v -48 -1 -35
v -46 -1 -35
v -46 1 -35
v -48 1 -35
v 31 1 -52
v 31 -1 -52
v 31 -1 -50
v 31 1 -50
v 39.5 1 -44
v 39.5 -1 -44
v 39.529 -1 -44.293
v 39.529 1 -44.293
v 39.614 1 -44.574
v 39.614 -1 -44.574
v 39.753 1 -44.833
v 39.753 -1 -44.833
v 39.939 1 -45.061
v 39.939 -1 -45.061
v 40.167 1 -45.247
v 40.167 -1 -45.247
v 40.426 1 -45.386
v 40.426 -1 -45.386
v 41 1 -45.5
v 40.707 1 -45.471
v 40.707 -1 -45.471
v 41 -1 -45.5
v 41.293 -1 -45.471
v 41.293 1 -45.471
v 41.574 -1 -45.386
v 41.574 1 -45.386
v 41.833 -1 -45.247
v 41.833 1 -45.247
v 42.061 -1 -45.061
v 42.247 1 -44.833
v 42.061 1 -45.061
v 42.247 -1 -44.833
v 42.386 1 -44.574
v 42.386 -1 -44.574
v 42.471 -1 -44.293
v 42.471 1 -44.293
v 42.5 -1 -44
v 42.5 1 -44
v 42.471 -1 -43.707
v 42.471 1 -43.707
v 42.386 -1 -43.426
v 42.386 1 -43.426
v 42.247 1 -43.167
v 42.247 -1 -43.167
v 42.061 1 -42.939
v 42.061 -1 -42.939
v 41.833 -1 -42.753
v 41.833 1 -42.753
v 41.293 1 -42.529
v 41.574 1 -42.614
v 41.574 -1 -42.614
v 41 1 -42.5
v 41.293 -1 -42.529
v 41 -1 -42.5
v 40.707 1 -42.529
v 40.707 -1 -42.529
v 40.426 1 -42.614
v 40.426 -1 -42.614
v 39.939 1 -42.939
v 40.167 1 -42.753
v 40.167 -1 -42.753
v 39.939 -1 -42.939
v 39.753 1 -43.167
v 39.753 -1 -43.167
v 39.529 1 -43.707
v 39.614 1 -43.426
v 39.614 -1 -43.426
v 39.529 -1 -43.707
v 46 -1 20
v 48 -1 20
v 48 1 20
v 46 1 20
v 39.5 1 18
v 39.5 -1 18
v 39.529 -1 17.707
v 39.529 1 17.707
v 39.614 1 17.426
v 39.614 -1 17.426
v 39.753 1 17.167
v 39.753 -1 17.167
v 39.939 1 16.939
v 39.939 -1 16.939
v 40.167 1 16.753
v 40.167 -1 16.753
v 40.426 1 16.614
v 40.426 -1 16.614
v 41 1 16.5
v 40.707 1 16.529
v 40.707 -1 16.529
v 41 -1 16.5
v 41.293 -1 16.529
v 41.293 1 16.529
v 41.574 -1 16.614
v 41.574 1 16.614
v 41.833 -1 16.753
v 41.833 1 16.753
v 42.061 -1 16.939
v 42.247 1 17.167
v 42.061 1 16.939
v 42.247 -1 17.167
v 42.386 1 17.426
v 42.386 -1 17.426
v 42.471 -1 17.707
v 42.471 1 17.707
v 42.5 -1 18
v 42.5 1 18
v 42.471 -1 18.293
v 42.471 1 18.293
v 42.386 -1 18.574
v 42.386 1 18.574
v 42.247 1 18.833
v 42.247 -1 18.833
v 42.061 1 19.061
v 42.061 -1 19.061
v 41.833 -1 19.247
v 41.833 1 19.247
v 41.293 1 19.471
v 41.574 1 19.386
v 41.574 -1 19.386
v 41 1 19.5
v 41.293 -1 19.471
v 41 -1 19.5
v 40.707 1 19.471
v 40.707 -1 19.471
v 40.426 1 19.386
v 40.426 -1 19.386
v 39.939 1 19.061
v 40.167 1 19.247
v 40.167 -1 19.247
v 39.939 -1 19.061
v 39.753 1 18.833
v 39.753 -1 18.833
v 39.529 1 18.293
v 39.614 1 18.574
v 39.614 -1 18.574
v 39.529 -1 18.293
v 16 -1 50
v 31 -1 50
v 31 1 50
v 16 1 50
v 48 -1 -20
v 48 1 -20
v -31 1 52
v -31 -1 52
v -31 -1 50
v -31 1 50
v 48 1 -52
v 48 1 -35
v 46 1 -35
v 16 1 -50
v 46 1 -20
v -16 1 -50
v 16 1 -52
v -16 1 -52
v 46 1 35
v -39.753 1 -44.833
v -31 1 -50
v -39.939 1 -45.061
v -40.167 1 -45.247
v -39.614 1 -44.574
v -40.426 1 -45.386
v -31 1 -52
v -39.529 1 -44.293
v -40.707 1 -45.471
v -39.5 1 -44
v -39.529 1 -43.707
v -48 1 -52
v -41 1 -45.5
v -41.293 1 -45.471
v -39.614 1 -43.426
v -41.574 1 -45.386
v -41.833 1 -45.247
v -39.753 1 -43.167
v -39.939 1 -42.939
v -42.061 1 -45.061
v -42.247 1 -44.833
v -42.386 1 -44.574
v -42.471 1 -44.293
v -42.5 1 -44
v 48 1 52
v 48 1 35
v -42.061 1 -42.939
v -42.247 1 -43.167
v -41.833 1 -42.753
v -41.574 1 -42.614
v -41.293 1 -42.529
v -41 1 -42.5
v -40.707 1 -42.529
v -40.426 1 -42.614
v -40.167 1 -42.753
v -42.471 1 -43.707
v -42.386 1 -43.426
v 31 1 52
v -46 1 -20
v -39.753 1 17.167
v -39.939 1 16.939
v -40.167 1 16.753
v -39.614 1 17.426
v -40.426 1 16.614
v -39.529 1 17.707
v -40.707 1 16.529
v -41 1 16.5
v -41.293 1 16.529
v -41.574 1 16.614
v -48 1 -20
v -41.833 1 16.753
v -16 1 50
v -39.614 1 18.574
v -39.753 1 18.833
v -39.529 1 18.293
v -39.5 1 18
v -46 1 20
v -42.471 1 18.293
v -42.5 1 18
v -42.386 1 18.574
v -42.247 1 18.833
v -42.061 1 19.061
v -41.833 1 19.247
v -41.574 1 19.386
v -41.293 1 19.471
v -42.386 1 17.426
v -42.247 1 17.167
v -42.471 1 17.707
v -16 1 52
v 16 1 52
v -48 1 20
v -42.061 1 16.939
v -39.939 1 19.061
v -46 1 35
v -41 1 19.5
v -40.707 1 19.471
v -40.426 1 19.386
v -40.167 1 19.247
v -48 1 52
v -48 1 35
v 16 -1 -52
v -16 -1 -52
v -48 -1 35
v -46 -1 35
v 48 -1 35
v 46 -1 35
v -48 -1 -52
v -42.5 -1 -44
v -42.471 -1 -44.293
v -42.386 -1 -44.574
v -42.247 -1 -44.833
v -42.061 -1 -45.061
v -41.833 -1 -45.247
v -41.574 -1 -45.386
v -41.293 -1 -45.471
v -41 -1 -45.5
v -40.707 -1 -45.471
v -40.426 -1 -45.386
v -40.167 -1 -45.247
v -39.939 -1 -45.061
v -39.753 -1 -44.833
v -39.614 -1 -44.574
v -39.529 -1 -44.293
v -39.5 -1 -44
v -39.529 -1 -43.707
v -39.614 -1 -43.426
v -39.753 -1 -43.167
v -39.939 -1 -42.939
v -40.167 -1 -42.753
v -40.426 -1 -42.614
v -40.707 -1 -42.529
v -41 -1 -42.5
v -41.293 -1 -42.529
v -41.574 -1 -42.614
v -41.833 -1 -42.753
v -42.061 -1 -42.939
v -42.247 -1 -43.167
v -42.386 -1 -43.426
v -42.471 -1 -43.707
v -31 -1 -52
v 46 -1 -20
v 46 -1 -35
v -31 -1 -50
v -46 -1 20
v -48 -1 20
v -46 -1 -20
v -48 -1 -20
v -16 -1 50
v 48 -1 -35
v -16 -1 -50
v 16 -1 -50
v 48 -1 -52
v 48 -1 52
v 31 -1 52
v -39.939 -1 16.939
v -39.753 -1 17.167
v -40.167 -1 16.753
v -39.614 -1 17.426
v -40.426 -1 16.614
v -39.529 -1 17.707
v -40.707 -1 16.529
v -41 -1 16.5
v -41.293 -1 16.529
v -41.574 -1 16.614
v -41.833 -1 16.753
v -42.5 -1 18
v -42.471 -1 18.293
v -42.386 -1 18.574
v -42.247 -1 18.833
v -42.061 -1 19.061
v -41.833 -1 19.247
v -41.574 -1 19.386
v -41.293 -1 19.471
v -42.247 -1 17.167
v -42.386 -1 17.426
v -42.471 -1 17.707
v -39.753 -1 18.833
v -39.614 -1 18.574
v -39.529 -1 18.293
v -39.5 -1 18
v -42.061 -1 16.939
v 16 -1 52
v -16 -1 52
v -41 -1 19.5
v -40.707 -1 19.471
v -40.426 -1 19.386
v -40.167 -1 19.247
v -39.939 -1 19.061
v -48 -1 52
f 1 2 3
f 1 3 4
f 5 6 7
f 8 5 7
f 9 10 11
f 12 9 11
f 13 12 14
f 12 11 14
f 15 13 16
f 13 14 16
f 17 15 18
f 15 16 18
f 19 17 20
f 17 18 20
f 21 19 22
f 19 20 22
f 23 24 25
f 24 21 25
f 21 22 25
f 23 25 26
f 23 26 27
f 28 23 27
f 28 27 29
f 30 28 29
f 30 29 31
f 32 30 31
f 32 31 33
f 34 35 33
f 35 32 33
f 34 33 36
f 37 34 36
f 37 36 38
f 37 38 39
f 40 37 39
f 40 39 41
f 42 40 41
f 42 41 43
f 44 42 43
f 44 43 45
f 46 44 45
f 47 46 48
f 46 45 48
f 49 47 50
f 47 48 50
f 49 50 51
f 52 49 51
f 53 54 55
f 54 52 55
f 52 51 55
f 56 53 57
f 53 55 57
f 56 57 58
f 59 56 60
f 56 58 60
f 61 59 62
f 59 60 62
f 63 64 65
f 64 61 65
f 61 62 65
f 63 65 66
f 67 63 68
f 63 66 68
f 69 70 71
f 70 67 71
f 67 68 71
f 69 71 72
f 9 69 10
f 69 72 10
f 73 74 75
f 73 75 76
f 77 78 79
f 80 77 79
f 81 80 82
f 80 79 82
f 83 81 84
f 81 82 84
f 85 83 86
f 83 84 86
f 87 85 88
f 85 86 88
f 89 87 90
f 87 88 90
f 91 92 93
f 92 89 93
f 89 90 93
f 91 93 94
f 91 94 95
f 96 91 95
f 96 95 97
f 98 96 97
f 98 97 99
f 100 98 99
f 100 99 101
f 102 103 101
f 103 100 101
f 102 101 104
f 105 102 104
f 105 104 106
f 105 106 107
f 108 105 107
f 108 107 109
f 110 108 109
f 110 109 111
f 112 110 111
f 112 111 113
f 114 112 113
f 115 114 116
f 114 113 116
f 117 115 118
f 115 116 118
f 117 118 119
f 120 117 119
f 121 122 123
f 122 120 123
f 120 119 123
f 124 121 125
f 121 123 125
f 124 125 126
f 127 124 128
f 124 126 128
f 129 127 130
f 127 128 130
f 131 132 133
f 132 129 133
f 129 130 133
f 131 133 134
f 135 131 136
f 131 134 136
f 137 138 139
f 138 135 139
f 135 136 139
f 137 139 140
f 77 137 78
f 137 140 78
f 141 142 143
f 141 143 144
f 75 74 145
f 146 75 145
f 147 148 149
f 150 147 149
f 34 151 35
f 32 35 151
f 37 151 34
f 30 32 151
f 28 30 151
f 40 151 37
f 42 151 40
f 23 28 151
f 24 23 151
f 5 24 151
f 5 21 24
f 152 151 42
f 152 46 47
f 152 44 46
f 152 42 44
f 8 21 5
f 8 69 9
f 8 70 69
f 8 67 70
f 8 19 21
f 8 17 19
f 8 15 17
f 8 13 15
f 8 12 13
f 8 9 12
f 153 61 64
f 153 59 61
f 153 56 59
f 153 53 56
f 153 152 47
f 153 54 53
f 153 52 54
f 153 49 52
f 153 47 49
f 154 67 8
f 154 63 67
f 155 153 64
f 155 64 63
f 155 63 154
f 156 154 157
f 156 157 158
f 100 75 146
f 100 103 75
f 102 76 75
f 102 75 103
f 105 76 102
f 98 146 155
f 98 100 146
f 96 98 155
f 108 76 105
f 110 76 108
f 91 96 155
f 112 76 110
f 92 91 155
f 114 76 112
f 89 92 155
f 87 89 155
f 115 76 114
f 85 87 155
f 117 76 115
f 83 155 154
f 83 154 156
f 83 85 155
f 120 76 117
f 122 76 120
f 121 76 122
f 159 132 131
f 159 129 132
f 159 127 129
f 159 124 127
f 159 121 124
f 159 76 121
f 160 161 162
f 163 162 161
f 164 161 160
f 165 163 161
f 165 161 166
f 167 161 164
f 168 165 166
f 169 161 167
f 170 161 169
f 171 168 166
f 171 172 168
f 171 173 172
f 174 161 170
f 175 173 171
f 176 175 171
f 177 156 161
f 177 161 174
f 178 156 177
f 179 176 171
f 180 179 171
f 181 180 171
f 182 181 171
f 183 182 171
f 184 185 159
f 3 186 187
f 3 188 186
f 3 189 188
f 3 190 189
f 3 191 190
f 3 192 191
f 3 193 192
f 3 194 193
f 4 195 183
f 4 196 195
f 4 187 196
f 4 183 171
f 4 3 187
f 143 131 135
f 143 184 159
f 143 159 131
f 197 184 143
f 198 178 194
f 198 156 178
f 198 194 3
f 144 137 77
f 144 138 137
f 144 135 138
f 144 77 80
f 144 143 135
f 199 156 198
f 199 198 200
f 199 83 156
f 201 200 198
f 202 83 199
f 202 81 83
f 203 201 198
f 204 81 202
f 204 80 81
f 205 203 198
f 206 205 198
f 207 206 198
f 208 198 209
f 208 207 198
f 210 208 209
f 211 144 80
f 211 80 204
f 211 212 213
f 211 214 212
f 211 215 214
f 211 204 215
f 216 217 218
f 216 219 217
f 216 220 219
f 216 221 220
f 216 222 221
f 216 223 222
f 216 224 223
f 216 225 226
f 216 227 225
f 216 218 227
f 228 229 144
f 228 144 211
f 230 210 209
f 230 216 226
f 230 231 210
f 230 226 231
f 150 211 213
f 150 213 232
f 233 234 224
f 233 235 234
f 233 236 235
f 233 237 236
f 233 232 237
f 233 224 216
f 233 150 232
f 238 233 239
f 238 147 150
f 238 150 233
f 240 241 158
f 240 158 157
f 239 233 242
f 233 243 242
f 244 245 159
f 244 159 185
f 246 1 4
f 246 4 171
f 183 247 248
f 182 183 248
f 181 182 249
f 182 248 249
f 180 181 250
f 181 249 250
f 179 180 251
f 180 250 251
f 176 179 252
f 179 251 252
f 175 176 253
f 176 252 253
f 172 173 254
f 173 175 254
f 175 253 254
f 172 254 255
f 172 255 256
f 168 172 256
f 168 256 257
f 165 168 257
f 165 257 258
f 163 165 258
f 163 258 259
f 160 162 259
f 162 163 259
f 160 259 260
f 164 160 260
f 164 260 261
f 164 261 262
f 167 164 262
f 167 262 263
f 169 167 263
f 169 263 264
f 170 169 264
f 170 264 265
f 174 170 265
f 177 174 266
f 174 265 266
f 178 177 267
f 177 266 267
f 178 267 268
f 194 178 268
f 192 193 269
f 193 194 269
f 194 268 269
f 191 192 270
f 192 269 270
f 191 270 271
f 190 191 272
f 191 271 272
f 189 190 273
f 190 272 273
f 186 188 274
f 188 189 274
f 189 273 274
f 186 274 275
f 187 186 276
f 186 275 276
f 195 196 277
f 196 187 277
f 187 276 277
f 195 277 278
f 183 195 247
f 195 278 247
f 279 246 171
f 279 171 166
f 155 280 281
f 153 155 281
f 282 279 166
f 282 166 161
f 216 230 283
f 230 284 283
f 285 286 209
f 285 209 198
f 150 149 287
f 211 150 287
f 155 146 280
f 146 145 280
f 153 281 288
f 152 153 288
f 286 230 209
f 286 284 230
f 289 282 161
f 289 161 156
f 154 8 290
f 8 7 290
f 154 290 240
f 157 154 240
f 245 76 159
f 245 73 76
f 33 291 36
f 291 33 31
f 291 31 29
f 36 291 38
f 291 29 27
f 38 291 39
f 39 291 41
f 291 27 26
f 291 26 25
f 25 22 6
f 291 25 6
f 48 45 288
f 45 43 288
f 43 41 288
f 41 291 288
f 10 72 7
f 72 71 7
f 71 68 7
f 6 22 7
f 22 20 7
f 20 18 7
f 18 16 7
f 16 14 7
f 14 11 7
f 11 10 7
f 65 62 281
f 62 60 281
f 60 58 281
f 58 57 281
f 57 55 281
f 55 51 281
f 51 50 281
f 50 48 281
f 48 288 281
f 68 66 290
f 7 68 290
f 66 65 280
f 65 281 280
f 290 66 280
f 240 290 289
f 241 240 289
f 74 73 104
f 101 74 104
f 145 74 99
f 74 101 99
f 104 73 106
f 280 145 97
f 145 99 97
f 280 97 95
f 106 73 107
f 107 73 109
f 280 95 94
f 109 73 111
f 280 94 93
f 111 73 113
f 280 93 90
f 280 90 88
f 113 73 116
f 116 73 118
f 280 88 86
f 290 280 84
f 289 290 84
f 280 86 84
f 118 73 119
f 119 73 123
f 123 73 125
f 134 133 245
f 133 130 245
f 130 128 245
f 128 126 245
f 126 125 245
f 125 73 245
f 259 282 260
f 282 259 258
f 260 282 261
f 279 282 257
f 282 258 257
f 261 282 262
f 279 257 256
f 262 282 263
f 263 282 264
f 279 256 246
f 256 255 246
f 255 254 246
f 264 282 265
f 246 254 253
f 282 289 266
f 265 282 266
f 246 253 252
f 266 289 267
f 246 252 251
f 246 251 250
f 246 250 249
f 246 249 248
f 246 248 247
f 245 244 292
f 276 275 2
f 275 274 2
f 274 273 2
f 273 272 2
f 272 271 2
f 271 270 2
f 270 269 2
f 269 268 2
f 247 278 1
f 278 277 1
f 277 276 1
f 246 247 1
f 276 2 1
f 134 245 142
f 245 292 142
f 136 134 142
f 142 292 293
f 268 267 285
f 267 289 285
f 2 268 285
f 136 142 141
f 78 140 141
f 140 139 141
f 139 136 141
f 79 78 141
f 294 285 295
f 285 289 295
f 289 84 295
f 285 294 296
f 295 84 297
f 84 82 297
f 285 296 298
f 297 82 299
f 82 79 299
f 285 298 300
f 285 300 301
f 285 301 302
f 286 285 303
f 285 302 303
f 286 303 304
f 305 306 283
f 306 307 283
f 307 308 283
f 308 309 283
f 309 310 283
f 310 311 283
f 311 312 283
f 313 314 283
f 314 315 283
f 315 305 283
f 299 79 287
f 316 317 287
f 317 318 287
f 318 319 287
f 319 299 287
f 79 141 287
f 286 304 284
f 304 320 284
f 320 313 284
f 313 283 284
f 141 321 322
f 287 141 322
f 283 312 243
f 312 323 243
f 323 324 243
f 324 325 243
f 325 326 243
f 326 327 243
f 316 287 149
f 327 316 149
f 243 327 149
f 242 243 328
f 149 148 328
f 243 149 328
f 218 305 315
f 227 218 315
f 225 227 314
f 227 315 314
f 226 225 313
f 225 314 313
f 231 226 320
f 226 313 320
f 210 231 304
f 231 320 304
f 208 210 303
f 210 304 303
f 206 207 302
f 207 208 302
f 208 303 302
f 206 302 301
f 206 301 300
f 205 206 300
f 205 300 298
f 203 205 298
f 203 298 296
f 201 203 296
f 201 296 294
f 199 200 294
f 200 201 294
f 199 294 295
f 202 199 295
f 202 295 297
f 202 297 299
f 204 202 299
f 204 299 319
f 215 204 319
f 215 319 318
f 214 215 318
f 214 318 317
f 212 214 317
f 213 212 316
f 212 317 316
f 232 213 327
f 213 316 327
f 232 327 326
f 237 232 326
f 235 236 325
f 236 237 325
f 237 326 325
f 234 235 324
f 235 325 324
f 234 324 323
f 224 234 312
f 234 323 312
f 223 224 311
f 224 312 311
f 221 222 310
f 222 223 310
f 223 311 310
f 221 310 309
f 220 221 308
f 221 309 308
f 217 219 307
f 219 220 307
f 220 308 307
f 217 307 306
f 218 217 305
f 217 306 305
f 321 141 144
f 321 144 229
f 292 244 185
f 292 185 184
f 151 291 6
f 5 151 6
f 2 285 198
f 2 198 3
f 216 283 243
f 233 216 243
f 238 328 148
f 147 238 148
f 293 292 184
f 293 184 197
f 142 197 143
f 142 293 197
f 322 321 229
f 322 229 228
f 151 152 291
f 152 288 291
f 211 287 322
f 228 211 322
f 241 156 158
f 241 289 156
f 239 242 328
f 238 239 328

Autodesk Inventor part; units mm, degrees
ref_plane "YZ Plane" through (0, 0, 0) normal (1, 0, 0) x (0, 1, 0)
ref_plane "XZ Plane" through (0, 0, 0) normal (0, 1, 0) x (-1, 0, 0)
ref_plane "XY Plane" through (0, 0, 0) normal (0, 0, 1) x (1, 0, 0)
sketch "スケッチ1" plane through (0, 0, 0) normal (0, 1, 0) x (-1, 0, 0)
  line L0 (46, 50) -> (-46, 50) construction
  line L1 (-46, 50) -> (-46, -50) construction
  line L2 (-46, -50) -> (46, -50) construction
  line L3 (46, -50) -> (46, 50) construction
  line L4 (46, 50) -> (-46, -50) construction
  line L5 (-46, 50) -> (46, -50) construction
  circle A0 centre (41, -44) radius 1.5
  line L6 (45, 22) -> (-45, 22) construction
  line L7 (-45, 22) -> (-45, -48) construction
  line L8 (-45, -48) -> (45, -48) construction
  line L9 (45, -48) -> (45, 22) construction
  circle A1 centre (41, 18) radius 1.5
  circle A2 centre (-41, 18) radius 1.5
  circle A3 centre (-41, -44) radius 1.5
  line L10 (48, 0) -> (48, -20)
  line L11 (48, -20) -> (46, -20)
  line L12 (46, -20) -> (46, -35)
  line L13 (46, -35) -> (48, -35)
  line L14 (48, -35) -> (48, -52)
  line L15 (0, 0) -> (80.4536, 0) construction
  line L16 (48, 0) -> (48, 20)
  line L17 (48, 20) -> (46, 20)
  line L18 (46, 20) -> (46, 35)
  line L19 (46, 35) -> (48, 35)
  line L20 (48, 35) -> (48, 52)
  line L21 (0, 0) -> (0, 71.6244) construction
  line L22 (-48, 0) -> (-48, -20)
  line L23 (-48, -20) -> (-46, -20)
  line L24 (-46, -20) -> (-46, -35)
  line L25 (-46, -35) -> (-48, -35)
  line L26 (-48, -35) -> (-48, -52)
  line L27 (-48, 0) -> (-48, 20)
  line L28 (-48, 20) -> (-46, 20)
  line L29 (-46, 20) -> (-46, 35)
  line L30 (-46, 35) -> (-48, 35)
  line L31 (-48, 35) -> (-48, 52)
  line L32 (48, 52) -> (31, 52)
  line L33 (31, 52) -> (31, 50)
  line L34 (31, 50) -> (16, 50)
  line L35 (16, 50) -> (16, 52)
  line L36 (16, 52) -> (0, 52)
  line L37 (-48, 52) -> (-31, 52)
  line L38 (-31, 52) -> (-31, 50)
  line L39 (-31, 50) -> (-16, 50)
  line L40 (-16, 50) -> (-16, 52)
  line L41 (-16, 52) -> (0, 52)
  line L42 (46, -50) -> (-46, -50) construction
  line L43 (48, -52) -> (31, -52)
  line L44 (31, -52) -> (31, -50)
  line L45 (31, -50) -> (16, -50)
  line L46 (16, -50) -> (16, -52)
  line L47 (16, -52) -> (0, -52)
  line L48 (-16, -52) -> (0, -52)
  line L49 (-16, -50) -> (-16, -52)
  line L50 (-31, -50) -> (-16, -50)
  line L51 (-31, -52) -> (-31, -50)
  line L52 (-48, -52) -> (-31, -52)
  dimension "d0" = 92
  dimension "d1" = 100
  dimension "d2" = 3
  dimension "d5" = 90
  dimension "d6" = 70
  dimension "d7" = 1
  dimension "d8" = 2
  dimension "d9" = 3
  dimension "d10" = 4
  dimension "d11" = 4
  dimension "d12" = 4
  dimension "d13" = 4
  dimension "d14" = 3
  dimension "d15" = 3
  dimension "d16" = 4
  dimension "d17" = 4
  dimension "d18" = 4
  dimension "d19" = 4
  dimension "d32" = 17
  dimension "d33" = 15
  dimension "d34" = 20
  dimension "d35" = 2
  dimension "d36" = 2
  dimension "d37" = 17
  dimension "d38" = 15
  dimension "d39" = 16
  dimension "d40" = 2
  dimension "d41" = 2
extrude "押し出し1" add sketch "スケッチ1" along normal mid plane 2
equation "\"d9\" = d2"
equation "\"d10\" = d11"
equation "\"d13\" = d12"
equation "\"d14\" = d2"
equation "\"d15\" = d2"
equation "\"d16\" = d11"
equation "\"d17\" = d10"
equation "\"d18\" = d11"
equation "\"d19\" = d10"
equation "\"d36\" = d35"
properties part number "Back"
